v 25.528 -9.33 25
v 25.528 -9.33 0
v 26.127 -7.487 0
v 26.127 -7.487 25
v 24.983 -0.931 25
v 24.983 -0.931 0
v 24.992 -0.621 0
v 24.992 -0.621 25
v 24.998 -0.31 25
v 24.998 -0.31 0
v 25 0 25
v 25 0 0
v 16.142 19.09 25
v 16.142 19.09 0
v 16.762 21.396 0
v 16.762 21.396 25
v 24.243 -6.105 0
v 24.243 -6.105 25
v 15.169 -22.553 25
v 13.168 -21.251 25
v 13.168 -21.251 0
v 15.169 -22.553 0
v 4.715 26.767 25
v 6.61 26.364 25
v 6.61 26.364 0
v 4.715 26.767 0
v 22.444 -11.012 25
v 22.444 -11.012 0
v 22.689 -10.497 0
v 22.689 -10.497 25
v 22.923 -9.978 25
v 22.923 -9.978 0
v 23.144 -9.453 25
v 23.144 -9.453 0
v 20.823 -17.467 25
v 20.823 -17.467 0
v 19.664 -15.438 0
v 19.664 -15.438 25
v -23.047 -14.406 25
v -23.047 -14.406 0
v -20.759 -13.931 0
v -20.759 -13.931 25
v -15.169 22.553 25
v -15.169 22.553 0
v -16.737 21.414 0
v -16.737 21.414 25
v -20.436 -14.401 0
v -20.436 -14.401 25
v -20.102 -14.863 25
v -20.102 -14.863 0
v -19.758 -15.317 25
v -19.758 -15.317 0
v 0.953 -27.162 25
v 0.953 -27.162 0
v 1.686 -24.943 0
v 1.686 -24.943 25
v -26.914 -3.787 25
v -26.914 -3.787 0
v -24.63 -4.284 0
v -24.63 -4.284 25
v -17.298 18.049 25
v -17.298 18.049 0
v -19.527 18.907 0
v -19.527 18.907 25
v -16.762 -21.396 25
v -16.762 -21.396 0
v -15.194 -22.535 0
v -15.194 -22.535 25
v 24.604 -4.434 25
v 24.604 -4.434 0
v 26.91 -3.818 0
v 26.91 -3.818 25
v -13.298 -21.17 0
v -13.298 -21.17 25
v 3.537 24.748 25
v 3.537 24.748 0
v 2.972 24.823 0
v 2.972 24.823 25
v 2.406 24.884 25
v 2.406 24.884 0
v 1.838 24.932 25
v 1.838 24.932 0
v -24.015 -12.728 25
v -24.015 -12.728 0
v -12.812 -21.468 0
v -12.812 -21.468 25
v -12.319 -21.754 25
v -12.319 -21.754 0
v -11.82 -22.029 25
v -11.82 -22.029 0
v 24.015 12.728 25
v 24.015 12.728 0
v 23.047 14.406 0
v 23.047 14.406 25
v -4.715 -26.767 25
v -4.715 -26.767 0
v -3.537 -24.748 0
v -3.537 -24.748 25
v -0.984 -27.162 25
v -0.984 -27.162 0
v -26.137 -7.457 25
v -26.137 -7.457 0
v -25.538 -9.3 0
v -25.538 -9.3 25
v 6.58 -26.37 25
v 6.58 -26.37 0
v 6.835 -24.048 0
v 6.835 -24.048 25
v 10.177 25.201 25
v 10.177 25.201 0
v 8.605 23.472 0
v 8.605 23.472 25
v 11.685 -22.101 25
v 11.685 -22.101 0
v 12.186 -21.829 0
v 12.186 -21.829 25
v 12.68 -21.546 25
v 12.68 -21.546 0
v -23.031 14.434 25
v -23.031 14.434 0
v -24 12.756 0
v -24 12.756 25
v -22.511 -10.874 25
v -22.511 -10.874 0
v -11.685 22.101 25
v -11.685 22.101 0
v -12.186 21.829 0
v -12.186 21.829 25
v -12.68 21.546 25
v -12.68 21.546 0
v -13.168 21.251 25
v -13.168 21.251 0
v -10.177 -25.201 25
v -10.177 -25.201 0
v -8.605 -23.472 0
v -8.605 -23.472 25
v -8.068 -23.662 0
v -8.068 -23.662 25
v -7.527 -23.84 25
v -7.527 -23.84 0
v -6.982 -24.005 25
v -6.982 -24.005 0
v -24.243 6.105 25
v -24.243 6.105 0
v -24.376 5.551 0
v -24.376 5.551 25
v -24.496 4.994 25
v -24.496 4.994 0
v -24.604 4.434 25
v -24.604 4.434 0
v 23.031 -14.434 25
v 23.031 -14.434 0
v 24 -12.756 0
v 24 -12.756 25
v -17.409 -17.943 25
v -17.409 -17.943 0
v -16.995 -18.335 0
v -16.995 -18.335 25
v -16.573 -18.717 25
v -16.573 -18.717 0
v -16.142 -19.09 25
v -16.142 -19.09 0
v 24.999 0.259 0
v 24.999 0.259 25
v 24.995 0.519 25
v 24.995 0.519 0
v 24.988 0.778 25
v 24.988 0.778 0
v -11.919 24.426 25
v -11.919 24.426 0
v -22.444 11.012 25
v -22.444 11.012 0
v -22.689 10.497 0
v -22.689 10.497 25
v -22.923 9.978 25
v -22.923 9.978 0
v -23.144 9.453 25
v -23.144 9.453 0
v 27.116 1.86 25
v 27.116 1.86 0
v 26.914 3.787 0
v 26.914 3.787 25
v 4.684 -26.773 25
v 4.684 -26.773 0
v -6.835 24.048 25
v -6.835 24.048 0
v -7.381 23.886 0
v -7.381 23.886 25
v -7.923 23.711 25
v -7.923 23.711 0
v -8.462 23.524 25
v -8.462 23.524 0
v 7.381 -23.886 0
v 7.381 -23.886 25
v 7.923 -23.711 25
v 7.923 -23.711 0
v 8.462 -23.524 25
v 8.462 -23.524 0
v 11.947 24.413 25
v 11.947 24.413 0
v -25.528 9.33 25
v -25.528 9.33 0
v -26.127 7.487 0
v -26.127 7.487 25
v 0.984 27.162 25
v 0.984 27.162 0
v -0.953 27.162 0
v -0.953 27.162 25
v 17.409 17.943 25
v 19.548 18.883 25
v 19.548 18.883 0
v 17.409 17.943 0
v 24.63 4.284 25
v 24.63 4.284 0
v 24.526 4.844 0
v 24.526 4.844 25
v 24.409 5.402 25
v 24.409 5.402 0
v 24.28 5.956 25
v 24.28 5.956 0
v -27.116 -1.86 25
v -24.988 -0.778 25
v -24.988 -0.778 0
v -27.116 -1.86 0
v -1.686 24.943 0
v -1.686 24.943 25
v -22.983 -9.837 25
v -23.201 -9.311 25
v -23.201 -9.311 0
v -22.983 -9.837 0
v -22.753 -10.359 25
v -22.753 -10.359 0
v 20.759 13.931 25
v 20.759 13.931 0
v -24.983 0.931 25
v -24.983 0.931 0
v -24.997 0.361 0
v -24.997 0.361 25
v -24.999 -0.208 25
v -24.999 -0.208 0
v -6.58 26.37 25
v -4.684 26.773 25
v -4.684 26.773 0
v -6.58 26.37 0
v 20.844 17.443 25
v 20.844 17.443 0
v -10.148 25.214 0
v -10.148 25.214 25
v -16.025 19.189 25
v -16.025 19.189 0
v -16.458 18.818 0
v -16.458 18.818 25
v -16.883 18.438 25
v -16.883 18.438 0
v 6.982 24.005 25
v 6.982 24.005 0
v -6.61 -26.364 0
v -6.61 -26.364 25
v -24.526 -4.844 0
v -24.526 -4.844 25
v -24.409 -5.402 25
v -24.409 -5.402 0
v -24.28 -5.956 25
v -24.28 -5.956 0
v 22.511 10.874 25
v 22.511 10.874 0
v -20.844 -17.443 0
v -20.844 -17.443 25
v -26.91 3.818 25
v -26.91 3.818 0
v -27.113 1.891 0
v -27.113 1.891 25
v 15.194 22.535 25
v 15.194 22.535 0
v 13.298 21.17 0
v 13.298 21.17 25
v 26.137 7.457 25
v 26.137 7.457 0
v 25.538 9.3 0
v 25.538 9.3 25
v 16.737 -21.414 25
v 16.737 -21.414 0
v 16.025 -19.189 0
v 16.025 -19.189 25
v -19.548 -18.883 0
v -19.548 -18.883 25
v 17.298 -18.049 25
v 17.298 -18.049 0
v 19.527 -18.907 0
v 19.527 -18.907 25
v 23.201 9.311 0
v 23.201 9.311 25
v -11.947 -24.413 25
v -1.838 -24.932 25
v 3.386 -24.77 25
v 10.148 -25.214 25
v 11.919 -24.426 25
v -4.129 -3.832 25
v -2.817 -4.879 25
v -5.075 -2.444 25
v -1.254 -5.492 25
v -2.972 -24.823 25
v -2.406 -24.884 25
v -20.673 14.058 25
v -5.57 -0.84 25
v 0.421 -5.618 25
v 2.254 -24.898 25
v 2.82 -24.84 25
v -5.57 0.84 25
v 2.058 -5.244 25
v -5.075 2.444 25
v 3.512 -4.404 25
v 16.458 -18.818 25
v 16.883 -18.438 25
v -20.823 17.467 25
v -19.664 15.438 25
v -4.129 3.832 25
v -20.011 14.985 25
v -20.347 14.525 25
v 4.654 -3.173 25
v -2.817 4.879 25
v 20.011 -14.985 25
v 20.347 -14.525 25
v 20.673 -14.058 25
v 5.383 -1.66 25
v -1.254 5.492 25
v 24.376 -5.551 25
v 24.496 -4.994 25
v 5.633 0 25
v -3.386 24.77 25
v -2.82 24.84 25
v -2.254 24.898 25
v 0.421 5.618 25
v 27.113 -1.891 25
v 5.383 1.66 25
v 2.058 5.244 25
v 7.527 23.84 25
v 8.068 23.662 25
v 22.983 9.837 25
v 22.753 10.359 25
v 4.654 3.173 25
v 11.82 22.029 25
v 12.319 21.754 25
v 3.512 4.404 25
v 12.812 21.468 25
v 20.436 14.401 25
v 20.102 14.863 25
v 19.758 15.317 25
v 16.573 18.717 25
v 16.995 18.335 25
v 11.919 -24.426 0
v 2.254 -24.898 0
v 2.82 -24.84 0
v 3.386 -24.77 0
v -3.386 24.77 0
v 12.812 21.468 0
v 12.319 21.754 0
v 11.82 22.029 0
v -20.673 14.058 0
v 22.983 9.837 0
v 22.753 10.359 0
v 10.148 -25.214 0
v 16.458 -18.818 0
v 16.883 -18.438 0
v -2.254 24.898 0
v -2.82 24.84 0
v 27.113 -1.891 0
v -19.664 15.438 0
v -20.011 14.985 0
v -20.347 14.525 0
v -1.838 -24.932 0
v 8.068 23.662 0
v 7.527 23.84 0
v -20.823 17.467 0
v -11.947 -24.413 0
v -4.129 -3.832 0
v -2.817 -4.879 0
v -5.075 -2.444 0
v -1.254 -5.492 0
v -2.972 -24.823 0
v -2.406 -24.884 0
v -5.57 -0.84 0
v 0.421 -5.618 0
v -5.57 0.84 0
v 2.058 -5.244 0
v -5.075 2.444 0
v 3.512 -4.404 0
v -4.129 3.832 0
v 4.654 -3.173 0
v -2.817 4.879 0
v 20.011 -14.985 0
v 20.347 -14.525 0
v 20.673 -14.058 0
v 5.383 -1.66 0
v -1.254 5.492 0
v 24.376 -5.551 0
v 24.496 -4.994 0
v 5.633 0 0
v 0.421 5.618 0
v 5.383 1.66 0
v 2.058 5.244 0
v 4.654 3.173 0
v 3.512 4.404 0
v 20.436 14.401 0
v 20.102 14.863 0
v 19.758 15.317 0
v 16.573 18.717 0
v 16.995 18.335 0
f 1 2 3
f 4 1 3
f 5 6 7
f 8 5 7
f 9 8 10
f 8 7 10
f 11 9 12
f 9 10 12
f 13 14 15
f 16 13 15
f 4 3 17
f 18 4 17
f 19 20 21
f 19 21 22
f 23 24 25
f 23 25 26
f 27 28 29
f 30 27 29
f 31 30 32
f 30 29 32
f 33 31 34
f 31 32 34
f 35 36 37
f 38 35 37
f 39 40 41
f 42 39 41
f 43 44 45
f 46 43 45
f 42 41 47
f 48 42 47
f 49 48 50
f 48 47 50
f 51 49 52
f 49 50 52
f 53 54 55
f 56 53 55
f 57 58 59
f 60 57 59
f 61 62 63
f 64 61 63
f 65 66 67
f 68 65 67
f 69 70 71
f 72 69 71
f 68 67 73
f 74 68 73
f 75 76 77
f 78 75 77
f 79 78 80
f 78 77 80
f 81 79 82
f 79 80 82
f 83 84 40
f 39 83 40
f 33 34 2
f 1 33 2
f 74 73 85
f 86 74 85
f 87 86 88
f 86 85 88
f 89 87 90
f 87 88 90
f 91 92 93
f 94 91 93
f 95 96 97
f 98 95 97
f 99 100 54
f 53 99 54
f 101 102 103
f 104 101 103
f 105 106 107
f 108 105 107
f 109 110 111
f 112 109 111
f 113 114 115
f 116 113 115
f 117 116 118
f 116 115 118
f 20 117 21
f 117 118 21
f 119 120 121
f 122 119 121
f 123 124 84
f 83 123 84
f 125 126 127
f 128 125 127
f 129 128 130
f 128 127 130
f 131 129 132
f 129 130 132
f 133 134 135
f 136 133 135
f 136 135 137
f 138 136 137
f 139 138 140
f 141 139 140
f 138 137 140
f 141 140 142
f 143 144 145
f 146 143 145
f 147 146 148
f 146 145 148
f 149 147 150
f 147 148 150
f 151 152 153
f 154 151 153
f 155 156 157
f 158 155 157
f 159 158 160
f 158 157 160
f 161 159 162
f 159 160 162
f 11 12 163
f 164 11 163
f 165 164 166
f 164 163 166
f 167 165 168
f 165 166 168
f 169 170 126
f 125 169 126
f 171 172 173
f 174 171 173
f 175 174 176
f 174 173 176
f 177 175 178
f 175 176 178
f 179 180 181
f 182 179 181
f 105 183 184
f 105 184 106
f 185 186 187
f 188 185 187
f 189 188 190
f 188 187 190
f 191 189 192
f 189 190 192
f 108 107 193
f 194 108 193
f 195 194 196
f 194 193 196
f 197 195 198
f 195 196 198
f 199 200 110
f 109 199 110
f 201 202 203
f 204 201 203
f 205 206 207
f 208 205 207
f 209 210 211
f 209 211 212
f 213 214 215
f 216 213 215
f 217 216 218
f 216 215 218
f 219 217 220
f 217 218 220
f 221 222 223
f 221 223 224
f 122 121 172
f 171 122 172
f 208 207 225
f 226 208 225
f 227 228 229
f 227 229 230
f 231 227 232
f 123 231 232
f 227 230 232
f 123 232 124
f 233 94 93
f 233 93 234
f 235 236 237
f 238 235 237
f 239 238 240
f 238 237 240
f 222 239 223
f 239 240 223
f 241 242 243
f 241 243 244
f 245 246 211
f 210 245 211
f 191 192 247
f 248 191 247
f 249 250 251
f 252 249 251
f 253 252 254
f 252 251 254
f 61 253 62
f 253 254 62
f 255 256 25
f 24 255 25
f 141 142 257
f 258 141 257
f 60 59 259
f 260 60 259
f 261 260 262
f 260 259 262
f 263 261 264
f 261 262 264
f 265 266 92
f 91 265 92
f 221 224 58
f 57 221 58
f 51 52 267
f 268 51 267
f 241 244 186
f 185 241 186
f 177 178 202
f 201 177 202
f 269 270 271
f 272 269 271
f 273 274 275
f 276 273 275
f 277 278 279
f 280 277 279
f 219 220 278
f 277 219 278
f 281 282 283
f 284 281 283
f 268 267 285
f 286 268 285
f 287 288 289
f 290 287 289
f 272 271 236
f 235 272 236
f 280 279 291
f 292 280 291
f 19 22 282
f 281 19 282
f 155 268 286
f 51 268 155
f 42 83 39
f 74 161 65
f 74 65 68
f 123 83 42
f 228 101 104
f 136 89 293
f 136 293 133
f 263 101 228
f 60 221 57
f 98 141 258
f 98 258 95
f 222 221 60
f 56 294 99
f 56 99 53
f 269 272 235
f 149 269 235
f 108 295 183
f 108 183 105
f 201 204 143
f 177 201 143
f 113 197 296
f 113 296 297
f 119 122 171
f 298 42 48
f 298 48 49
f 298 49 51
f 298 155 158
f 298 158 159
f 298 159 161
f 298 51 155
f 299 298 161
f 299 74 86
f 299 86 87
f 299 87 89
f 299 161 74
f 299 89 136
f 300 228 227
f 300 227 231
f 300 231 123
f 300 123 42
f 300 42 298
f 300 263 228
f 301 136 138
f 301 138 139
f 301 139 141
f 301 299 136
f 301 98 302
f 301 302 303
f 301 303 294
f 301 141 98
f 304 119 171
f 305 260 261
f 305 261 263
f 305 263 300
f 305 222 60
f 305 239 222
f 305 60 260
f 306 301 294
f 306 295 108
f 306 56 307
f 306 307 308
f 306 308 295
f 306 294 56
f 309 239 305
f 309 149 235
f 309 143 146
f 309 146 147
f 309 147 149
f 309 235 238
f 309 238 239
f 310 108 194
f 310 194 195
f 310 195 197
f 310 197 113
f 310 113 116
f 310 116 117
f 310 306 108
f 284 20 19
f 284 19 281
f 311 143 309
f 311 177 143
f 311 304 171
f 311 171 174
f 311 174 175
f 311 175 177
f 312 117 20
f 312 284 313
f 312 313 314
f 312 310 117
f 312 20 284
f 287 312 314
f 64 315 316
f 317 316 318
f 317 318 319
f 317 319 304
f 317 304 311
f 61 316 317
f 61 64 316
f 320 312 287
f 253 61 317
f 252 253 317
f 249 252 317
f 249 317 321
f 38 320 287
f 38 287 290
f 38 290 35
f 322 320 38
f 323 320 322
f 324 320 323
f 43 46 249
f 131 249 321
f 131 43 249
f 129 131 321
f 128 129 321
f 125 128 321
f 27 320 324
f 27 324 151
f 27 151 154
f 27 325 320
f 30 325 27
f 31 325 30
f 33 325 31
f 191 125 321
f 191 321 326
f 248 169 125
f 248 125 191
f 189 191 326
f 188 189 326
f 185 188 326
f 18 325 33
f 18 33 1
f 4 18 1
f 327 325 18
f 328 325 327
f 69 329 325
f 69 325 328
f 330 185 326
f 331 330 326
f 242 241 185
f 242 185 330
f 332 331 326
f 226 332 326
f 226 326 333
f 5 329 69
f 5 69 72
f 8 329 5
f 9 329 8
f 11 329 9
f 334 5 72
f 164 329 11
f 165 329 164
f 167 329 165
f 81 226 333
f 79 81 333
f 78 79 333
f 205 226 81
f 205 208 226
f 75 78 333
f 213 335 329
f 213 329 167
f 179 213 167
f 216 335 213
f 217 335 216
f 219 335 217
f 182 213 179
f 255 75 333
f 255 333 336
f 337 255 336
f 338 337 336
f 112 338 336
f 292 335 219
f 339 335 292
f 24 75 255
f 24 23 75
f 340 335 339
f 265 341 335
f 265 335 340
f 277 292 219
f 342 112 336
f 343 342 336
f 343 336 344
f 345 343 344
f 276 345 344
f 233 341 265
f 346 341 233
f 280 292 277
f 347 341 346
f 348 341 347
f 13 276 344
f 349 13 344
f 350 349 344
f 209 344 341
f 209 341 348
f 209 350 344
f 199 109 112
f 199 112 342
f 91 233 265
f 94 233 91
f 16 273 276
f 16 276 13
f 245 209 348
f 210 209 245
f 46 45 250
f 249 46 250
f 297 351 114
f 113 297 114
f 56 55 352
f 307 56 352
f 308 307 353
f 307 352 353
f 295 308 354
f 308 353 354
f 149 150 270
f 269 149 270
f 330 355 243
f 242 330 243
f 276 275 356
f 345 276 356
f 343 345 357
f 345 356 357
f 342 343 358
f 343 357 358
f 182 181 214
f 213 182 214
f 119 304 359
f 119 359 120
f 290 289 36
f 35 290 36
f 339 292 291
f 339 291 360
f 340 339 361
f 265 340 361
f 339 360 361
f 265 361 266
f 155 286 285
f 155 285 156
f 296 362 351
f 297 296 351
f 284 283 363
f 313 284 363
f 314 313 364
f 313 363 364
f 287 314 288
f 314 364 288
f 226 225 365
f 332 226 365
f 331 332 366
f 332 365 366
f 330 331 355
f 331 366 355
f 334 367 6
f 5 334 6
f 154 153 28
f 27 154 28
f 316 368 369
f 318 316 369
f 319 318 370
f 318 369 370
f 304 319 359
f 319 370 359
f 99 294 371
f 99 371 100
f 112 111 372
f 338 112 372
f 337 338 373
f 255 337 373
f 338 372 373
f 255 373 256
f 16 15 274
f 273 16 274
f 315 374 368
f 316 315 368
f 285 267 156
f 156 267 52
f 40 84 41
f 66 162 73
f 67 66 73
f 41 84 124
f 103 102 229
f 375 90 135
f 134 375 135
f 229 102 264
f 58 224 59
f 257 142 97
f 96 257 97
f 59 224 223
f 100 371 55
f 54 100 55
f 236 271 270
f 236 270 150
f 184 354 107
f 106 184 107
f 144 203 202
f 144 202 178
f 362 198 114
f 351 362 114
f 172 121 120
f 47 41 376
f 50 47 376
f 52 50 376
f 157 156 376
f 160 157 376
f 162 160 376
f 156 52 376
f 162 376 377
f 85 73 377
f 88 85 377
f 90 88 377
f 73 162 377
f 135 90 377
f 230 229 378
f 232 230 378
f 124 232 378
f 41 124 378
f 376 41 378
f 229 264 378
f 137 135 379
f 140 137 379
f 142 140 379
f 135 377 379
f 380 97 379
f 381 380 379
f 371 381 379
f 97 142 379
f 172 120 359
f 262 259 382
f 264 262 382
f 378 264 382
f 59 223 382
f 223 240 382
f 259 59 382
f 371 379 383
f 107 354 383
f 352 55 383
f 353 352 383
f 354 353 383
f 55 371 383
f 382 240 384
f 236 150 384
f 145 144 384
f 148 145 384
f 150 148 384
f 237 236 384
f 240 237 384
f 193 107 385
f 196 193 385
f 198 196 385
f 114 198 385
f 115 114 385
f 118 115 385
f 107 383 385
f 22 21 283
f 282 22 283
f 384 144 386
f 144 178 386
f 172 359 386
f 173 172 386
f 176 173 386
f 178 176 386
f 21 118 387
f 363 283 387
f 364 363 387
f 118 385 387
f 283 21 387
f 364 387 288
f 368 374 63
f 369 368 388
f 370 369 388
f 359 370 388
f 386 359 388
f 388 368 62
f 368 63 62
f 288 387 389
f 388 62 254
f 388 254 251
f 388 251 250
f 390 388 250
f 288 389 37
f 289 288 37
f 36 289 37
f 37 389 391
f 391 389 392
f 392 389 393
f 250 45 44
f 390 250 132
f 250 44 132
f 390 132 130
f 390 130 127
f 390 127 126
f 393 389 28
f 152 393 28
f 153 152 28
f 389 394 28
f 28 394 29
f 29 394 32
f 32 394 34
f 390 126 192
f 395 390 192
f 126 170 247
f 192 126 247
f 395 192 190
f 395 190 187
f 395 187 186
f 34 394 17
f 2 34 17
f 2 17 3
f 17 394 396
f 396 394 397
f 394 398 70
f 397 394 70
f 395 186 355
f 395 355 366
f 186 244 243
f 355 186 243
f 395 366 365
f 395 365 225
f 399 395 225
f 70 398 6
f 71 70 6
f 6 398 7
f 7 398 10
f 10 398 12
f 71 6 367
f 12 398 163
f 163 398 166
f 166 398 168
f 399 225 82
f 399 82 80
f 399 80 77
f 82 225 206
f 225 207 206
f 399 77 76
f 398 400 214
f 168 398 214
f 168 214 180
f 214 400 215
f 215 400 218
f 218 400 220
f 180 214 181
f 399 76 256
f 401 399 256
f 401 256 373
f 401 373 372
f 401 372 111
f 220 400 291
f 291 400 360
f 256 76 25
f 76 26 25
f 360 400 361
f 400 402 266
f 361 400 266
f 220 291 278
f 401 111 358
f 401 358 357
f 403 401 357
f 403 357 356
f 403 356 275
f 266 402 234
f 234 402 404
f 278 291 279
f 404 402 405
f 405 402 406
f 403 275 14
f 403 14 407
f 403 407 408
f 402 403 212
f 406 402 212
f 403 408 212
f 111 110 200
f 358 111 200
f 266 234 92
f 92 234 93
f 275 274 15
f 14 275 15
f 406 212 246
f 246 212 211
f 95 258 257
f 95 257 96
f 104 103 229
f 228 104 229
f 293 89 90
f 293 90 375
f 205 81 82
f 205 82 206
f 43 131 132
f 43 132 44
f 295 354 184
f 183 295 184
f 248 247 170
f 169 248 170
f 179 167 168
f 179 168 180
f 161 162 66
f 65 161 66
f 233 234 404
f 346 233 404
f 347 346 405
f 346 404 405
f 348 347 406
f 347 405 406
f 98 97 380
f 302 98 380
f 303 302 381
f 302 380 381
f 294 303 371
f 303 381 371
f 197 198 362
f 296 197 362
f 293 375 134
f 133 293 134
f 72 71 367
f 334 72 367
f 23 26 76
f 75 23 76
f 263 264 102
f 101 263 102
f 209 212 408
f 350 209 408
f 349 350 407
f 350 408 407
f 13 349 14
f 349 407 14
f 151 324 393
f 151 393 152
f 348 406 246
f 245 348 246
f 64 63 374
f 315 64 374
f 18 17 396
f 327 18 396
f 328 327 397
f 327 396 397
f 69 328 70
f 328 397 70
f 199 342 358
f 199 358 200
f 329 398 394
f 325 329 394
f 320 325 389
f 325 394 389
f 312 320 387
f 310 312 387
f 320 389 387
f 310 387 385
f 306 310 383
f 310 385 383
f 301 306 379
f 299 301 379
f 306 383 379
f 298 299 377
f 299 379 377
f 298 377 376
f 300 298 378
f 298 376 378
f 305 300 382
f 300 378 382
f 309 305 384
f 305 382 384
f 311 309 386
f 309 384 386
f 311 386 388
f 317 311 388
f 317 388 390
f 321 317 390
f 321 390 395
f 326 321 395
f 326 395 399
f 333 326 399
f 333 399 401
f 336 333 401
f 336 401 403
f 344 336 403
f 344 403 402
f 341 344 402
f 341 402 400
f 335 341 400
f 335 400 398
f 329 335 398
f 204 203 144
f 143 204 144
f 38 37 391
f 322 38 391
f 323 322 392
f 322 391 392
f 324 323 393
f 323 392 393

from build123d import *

# Parameters (mm, degrees)
F1_DEPTH = 25
F2_R     = 5.6332582932
F3_DEPTH = 25.001


with BuildPart() as f1:
    # F0 (on Top) → F1 (new body)
    with BuildSketch(Plane.XY):
        with BuildLine():
            ThreePointArc((24.9826599942, -0.9309670328), (24.9956646226, -0.4655642523), (25, 0))
            ThreePointArc((25, 0), (24.9969712413, 0.3891384843), (24.9878856992, 0.77818268))
            ThreePointArc((24.9878856992, 0.77818268), (24.8709209984, 2.5371812491), (24.6302878631, 4.283563911))
            ThreePointArc((24.6302878631, 4.283563911), (24.4694678339, 5.1230014568), (24.2800471673, 5.956451087))
            ThreePointArc((24.2800471673, 5.956451087), (23.7999220592, 7.6526929884), (23.2014539632, 9.3108825571))
            ThreePointArc((23.2014539632, 9.3108825571), (22.869619358, 10.0985400143), (22.5110540656, 10.8743939994))
            ThreePointArc((22.5110540656, 10.8743939994), (21.6887523213, 12.4337453224), (20.7586051922, 13.9312709568))
            ThreePointArc((20.7586051922, 13.9312709568), (20.2702587756, 14.6327239149), (19.7582198813, 15.3170737128))
            ThreePointArc((19.7582198813, 15.3170737128), (18.6296800329, 16.6713833221), (17.4085057635, 17.9427959661))
            ThreePointArc((17.4085057635, 17.9427959661), (16.7849906172, 18.5273875649), (16.1418566776, 19.0903238055))
            ThreePointArc((16.1418566776, 19.0903238055), (14.7564013318, 20.1804018725), (13.2975710976, 21.1701346926))
            ThreePointArc((13.2975710976, 21.1701346926), (12.5661378255, 21.6123154741), (11.82001688, 22.0292351424))
            ThreePointArc((11.82001688, 22.0292351424), (10.2381970835, 22.8074400247), (8.6054687659, 23.4722369475))
            ThreePointArc((8.6054687659, 23.4722369475), (7.7980845118, 23.7526814896), (6.9815856259, 24.0053631955))
            ThreePointArc((6.9815856259, 24.0053631955), (5.2725344943, 24.4376836056), (3.5372661556, 24.7484898154))
            ThreePointArc((3.5372661556, 24.7484898154), (2.6892174855, 24.854941346), (1.8380255786, 24.9323416865))
            ThreePointArc((1.8380255786, 24.9323416865), (0.9196352096, 24.9830796957), (0, 25))
            ThreePointArc((0, 25), (-0.8432457973, 24.9857746833), (-1.6855319595, 24.943114922))
            ThreePointArc((-1.6855319595, 24.943114922), (-2.5371812491, 24.8709209984), (-3.3858650063, 24.7696572071))
            ThreePointArc((-3.3858650063, 24.7696572071), (-5.1230014568, 24.4694678339), (-6.8346642398, 24.0476062162))
            ThreePointArc((-6.8346642398, 24.0476062162), (-7.6526929884, 23.7999220592), (-8.4617770432, 23.5244198498))
            ThreePointArc((-8.4617770432, 23.5244198498), (-10.0985400143, 22.869619358), (-11.6850888965, 22.1011017255))
            ThreePointArc((-11.6850888965, 22.1011017255), (-12.4337453224, 21.6887523213), (-13.1678688193, 21.2510524624))
            ThreePointArc((-13.1678688193, 21.2510524624), (-14.6327239149, 20.2702587756), (-16.0248190972, 19.1886730365))
            ThreePointArc((-16.0248190972, 19.1886730365), (-16.6713833221, 18.6296800329), (-17.2984615414, 18.0489121085))
            ThreePointArc((-17.2984615414, 18.0489121085), (-18.5273875649, 16.7849906172), (-19.6641878077, 15.4376072584))
            ThreePointArc((-19.6641878077, 15.4376072584), (-20.1804018725, 14.7564013318), (-20.673028487, 14.0579476871))
            ThreePointArc((-20.673028487, 14.0579476871), (-21.6123154741, 12.5661378255), (-22.4441371517, 11.0118439652))
            ThreePointArc((-22.4441371517, 11.0118439652), (-22.8074400247, 10.2381970835), (-23.1440848876, 9.4525834943))
            ThreePointArc((-23.1440848876, 9.4525834943), (-23.7526814896, 7.7980845118), (-24.2431700033, 6.1048102501))
            ThreePointArc((-24.2431700033, 6.1048102501), (-24.4376836056, 5.2725344943), (-24.6036337208, 4.4340960443))
            ThreePointArc((-24.6036337208, 4.4340960443), (-24.854941346, 2.6892174855), (-24.9826599942, 0.9309670328))
            ThreePointArc((-24.9826599942, 0.9309670328), (-24.9998831479, 0.0764368473), (-24.9878856992, -0.77818268))
            ThreePointArc((-24.9878856992, -0.77818268), (-24.8709209984, -2.5371812491), (-24.6302878631, -4.283563911))
            ThreePointArc((-24.6302878631, -4.283563911), (-24.4694678339, -5.1230014568), (-24.2800471673, -5.956451087))
            ThreePointArc((-24.2800471673, -5.956451087), (-23.7999220592, -7.6526929884), (-23.2014539632, -9.3108825571))
            ThreePointArc((-23.2014539632, -9.3108825571), (-22.869619358, -10.0985400143), (-22.5110540656, -10.8743939994))
            ThreePointArc((-22.5110540656, -10.8743939994), (-21.6887523213, -12.4337453224), (-20.7586051922, -13.9312709568))
            ThreePointArc((-20.7586051922, -13.9312709568), (-20.2702587756, -14.6327239149), (-19.7582198813, -15.3170737128))
            ThreePointArc((-19.7582198813, -15.3170737128), (-18.6296800329, -16.6713833221), (-17.4085057635, -17.9427959661))
            ThreePointArc((-17.4085057635, -17.9427959661), (-16.7849906172, -18.5273875649), (-16.1418566776, -19.0903238055))
            ThreePointArc((-16.1418566776, -19.0903238055), (-14.7564013318, -20.1804018725), (-13.2975710976, -21.1701346926))
            ThreePointArc((-13.2975710976, -21.1701346926), (-12.5661378255, -21.6123154741), (-11.82001688, -22.0292351424))
            ThreePointArc((-11.82001688, -22.0292351424), (-10.2381970835, -22.8074400247), (-8.6054687659, -23.4722369475))
            ThreePointArc((-8.6054687659, -23.4722369475), (-7.7980845118, -23.7526814896), (-6.9815856259, -24.0053631955))
            ThreePointArc((-6.9815856259, -24.0053631955), (-5.2725344943, -24.4376836056), (-3.5372661556, -24.7484898154))
            ThreePointArc((-3.5372661556, -24.7484898154), (-2.6892174855, -24.854941346), (-1.8380255786, -24.9323416865))
            ThreePointArc((-1.8380255786, -24.9323416865), (-0.0764368473, -24.9998831479), (1.6855319595, -24.943114922))
            ThreePointArc((1.6855319595, -24.943114922), (2.5371812491, -24.8709209984), (3.3858650063, -24.7696572071))
            ThreePointArc((3.3858650063, -24.7696572071), (5.1230014568, -24.4694678339), (6.8346642398, -24.0476062162))
            ThreePointArc((6.8346642398, -24.0476062162), (7.6526929884, -23.7999220592), (8.4617770432, -23.5244198498))
            ThreePointArc((8.4617770432, -23.5244198498), (10.0985400143, -22.869619358), (11.6850888965, -22.1011017255))
            ThreePointArc((11.6850888965, -22.1011017255), (12.4337453224, -21.6887523213), (13.1678688193, -21.2510524624))
            ThreePointArc((13.1678688193, -21.2510524624), (14.6327239149, -20.2702587756), (16.0248190972, -19.1886730365))
            ThreePointArc((16.0248190972, -19.1886730365), (16.6713833221, -18.6296800329), (17.2984615414, -18.0489121085))
            ThreePointArc((17.2984615414, -18.0489121085), (18.5273875649, -16.7849906172), (19.6641878077, -15.4376072584))
            ThreePointArc((19.6641878077, -15.4376072584), (20.1804018725, -14.7564013318), (20.673028487, -14.0579476871))
            ThreePointArc((20.673028487, -14.0579476871), (21.6123154741, -12.5661378255), (22.4441371517, -11.0118439652))
            ThreePointArc((22.4441371517, -11.0118439652), (22.8074400247, -10.2381970835), (23.1440848876, -9.4525834943))
            ThreePointArc((23.1440848876, -9.4525834943), (23.7526814896, -7.7980845118), (24.2431700033, -6.1048102501))
            ThreePointArc((24.2431700033, -6.1048102501), (24.4376836056, -5.2725344943), (24.6036337208, -4.4340960443))
            ThreePointArc((24.6036337208, -4.4340960443), (24.854941346, -2.6892174855), (24.9826599942, -0.9309670328))
        make_face()
        with BuildLine():
            ThreePointArc((24.6302878631, 4.283563911), (24.8709209984, 2.5371812491), (24.9878856992, 0.77818268))
            Line((24.9878856992, 0.77818268), (27.1162286769, 1.8601129156))
            Line((27.1162286769, 1.8601129156), (26.9136978769, 3.7870647602))
            Line((26.9136978769, 3.7870647602), (24.6302878631, 4.283563911))
        make_face()
        with BuildLine():
            Line((27.1129440427, -1.8913641228), (24.9826599942, -0.9309670328))
            ThreePointArc((24.9826599942, -0.9309670328), (24.854941346, -2.6892174855), (24.6036337208, -4.4340960443))
            Line((24.6036337208, -4.4340960443), (26.9104132427, -3.8183159673))
            Line((26.9104132427, -3.8183159673), (27.1129440427, -1.8913641228))
        make_face()
        with BuildLine():
            ThreePointArc((23.2014539632, 9.3108825571), (23.7999220592, 7.6526929884), (24.2800471673, 5.956451087))
            Line((24.2800471673, 5.956451087), (26.1369347999, 7.4572459383))
            Line((26.1369347999, 7.4572459383), (25.5381939676, 9.2999807407))
            Line((25.5381939676, 9.2999807407), (23.2014539632, 9.3108825571))
        make_face()
        with BuildLine():
            Line((26.1272244515, -7.4871313177), (24.2431700033, -6.1048102501))
            ThreePointArc((24.2431700033, -6.1048102501), (23.7526814896, -7.7980845118), (23.1440848876, -9.4525834943))
            Line((23.1440848876, -9.4525834943), (25.5284836192, -9.3298661202))
            Line((25.5284836192, -9.3298661202), (26.1272244515, -7.4871313177))
        make_face()
        with BuildLine():
            ThreePointArc((20.7586051922, 13.9312709568), (21.6887523213, 12.4337453224), (22.5110540656, 10.8743939994))
            Line((22.5110540656, 10.8743939994), (24.0153314531, 12.7284615297))
            Line((24.0153314531, 12.7284615297), (23.0465484361, 14.4064429367))
            Line((23.0465484361, 14.4064429367), (20.7586051922, 13.9312709568))
        make_face()
        with BuildLine():
            Line((23.9996197794, -12.7556749469), (22.4441371517, -11.0118439652))
            ThreePointArc((22.4441371517, -11.0118439652), (21.6123154741, -12.5661378255), (20.673028487, -14.0579476871))
            Line((20.673028487, -14.0579476871), (23.0308367624, -14.4336563539))
            Line((23.0308367624, -14.4336563539), (23.9996197794, -12.7556749469))
        make_face()
        with BuildLine():
            ThreePointArc((17.4085057635, 17.9427959661), (18.6296800329, 16.6713833221), (19.7582198813, 15.3170737128))
            Line((19.7582198813, 15.3170737128), (20.8441428836, 17.4433822743))
            Line((20.8441428836, 17.4433822743), (19.5476581484, 18.8832744465))
            Line((19.5476581484, 18.8832744465), (17.4085057635, 17.9427959661))
        make_face()
        with BuildLine():
            Line((20.82311656, -17.4667343724), (19.6641878077, -15.4376072584))
            ThreePointArc((19.6641878077, -15.4376072584), (18.5273875649, -16.7849906172), (17.2984615414, -18.0489121085))
            Line((17.2984615414, -18.0489121085), (19.5266318248, -18.9066265446))
            Line((19.5266318248, -18.9066265446), (20.82311656, -17.4667343724))
        make_face()
        with BuildLine():
            ThreePointArc((13.2975710976, 21.1701346926), (14.7564013318, 20.1804018725), (16.1418566776, 19.0903238055))
            Line((16.1418566776, 19.0903238055), (16.7619652487, 21.3959435108))
            Line((16.7619652487, 21.3959435108), (15.1944413994, 22.534816251))
            Line((15.1944413994, 22.534816251), (13.2975710976, 21.1701346926))
        make_face()
        with BuildLine():
            Line((16.7365432265, -21.4144136911), (16.0248190972, -19.1886730365))
            ThreePointArc((16.0248190972, -19.1886730365), (14.6327239149, -20.2702587756), (13.1678688193, -21.2510524624))
            Line((13.1678688193, -21.2510524624), (15.1690193773, -22.5532864312))
            Line((15.1690193773, -22.5532864312), (16.7365432265, -21.4144136911))
        make_face()
        with BuildLine():
            ThreePointArc((8.6054687659, 23.4722369475), (10.2381970835, 22.8074400247), (11.82001688, 22.0292351424))
            Line((11.82001688, 22.0292351424), (11.9472092996, 24.4133993468))
            Line((11.9472092996, 24.4133993468), (10.1771546504, 25.2014784512))
            Line((10.1771546504, 25.2014784512), (8.6054687659, 23.4722369475))
        make_face()
        with BuildLine():
            Line((11.9185026432, -24.4261803737), (11.6850888965, -22.1011017255))
            ThreePointArc((11.6850888965, -22.1011017255), (10.0985400143, -22.869619358), (8.4617770432, -23.5244198498))
            Line((8.4617770432, -23.5244198498), (10.148447994, -25.2142594781))
            Line((10.148447994, -25.2142594781), (11.9185026432, -24.4261803737))
        make_face()
        with BuildLine():
            ThreePointArc((3.5372661556, 24.7484898154), (5.2725344943, 24.4376836056), (6.9815856259, 24.0053631955))
            Line((6.9815856259, 24.0053631955), (6.6103029751, 26.3638724829))
            Line((6.6103029751, 26.3638724829), (4.7150774076, 26.7667151131))
            Line((4.7150774076, 26.7667151131), (3.5372661556, 24.7484898154))
        make_face()
        with BuildLine():
            Line((6.5795663031, -26.3704057642), (6.8346642398, -24.0476062162))
            ThreePointArc((6.8346642398, -24.0476062162), (5.1230014568, -24.4694678339), (3.3858650063, -24.7696572071))
            Line((3.3858650063, -24.7696572071), (4.6843407356, -26.7732483944))
            Line((4.6843407356, -26.7732483944), (6.5795663031, -26.3704057642))
        make_face()
        with BuildLine():
            ThreePointArc((0, 25), (0.9196352096, 24.9830796957), (1.8380255786, 24.9323416865))
            Line((1.8380255786, 24.9323416865), (0.9844946908, 27.1621178836))
            Line((0.9844946908, 27.1621178836), (-0.9530713432, 27.1621178836))
            Line((-0.9530713432, 27.1621178836), (-1.6855319595, 24.943114922))
            ThreePointArc((-1.6855319595, 24.943114922), (-0.8432457973, 24.9857746833), (0, 25))
        make_face()
        with BuildLine():
            Line((0.9530713432, -27.1621178836), (1.6855319595, -24.943114922))
            ThreePointArc((1.6855319595, -24.943114922), (-0.0764368473, -24.9998831479), (-1.8380255786, -24.9323416865))
            Line((-1.8380255786, -24.9323416865), (-0.9844946908, -27.1621178836))
            Line((-0.9844946908, -27.1621178836), (0.9530713432, -27.1621178836))
        make_face()
        with BuildLine():
            Line((-4.7150774076, -26.7667151131), (-3.5372661556, -24.7484898154))
            ThreePointArc((-3.5372661556, -24.7484898154), (-5.2725344943, -24.4376836056), (-6.9815856259, -24.0053631955))
            Line((-6.9815856259, -24.0053631955), (-6.6103029751, -26.3638724829))
            Line((-6.6103029751, -26.3638724829), (-4.7150774076, -26.7667151131))
        make_face()
        with BuildLine():
            ThreePointArc((-6.8346642398, 24.0476062162), (-5.1230014568, 24.4694678339), (-3.3858650063, 24.7696572071))
            Line((-3.3858650063, 24.7696572071), (-4.6843407356, 26.7732483944))
            Line((-4.6843407356, 26.7732483944), (-6.5795663031, 26.3704057642))
            Line((-6.5795663031, 26.3704057642), (-6.8346642398, 24.0476062162))
        make_face()
        with BuildLine():
            Line((-10.1771546504, -25.2014784512), (-8.6054687659, -23.4722369475))
            ThreePointArc((-8.6054687659, -23.4722369475), (-10.2381970835, -22.8074400247), (-11.82001688, -22.0292351424))
            Line((-11.82001688, -22.0292351424), (-11.9472092996, -24.4133993468))
            Line((-11.9472092996, -24.4133993468), (-10.1771546504, -25.2014784512))
        make_face()
        with BuildLine():
            ThreePointArc((-11.6850888965, 22.1011017255), (-10.0985400143, 22.869619358), (-8.4617770432, 23.5244198498))
            Line((-8.4617770432, 23.5244198498), (-10.148447994, 25.2142594781))
            Line((-10.148447994, 25.2142594781), (-11.9185026432, 24.4261803737))
            Line((-11.9185026432, 24.4261803737), (-11.6850888965, 22.1011017255))
        make_face()
        with BuildLine():
            Line((-15.1944413994, -22.534816251), (-13.2975710976, -21.1701346926))
            ThreePointArc((-13.2975710976, -21.1701346926), (-14.7564013318, -20.1804018725), (-16.1418566776, -19.0903238055))
            Line((-16.1418566776, -19.0903238055), (-16.7619652487, -21.3959435108))
            Line((-16.7619652487, -21.3959435108), (-15.1944413994, -22.534816251))
        make_face()
        with BuildLine():
            ThreePointArc((-16.0248190972, 19.1886730365), (-14.6327239149, 20.2702587756), (-13.1678688193, 21.2510524624))
            Line((-13.1678688193, 21.2510524624), (-15.1690193773, 22.5532864312))
            Line((-15.1690193773, 22.5532864312), (-16.7365432265, 21.4144136911))
            Line((-16.7365432265, 21.4144136911), (-16.0248190972, 19.1886730365))
        make_face()
        with BuildLine():
            Line((-19.5476581484, -18.8832744465), (-17.4085057635, -17.9427959661))
            ThreePointArc((-17.4085057635, -17.9427959661), (-18.6296800329, -16.6713833221), (-19.7582198813, -15.3170737128))
            Line((-19.7582198813, -15.3170737128), (-20.8441428836, -17.4433822743))
            Line((-20.8441428836, -17.4433822743), (-19.5476581484, -18.8832744465))
        make_face()
        with BuildLine():
            ThreePointArc((-19.6641878077, 15.4376072584), (-18.5273875649, 16.7849906172), (-17.2984615414, 18.0489121085))
            Line((-17.2984615414, 18.0489121085), (-19.5266318248, 18.9066265446))
            Line((-19.5266318248, 18.9066265446), (-20.82311656, 17.4667343724))
            Line((-20.82311656, 17.4667343724), (-19.6641878077, 15.4376072584))
        make_face()
        with BuildLine():
            Line((-23.0465484361, -14.4064429367), (-20.7586051922, -13.9312709568))
            ThreePointArc((-20.7586051922, -13.9312709568), (-21.6887523213, -12.4337453224), (-22.5110540656, -10.8743939994))
            Line((-22.5110540656, -10.8743939994), (-24.0153314531, -12.7284615297))
            Line((-24.0153314531, -12.7284615297), (-23.0465484361, -14.4064429367))
        make_face()
        with BuildLine():
            ThreePointArc((-22.4441371517, 11.0118439652), (-21.6123154741, 12.5661378255), (-20.673028487, 14.0579476871))
            Line((-20.673028487, 14.0579476871), (-23.0308367624, 14.4336563539))
            Line((-23.0308367624, 14.4336563539), (-23.9996197794, 12.7556749469))
            Line((-23.9996197794, 12.7556749469), (-22.4441371517, 11.0118439652))
        make_face()
        with BuildLine():
            Line((-25.5381939676, -9.2999807407), (-23.2014539632, -9.3108825571))
            ThreePointArc((-23.2014539632, -9.3108825571), (-23.7999220592, -7.6526929884), (-24.2800471673, -5.956451087))
            Line((-24.2800471673, -5.956451087), (-26.1369347999, -7.4572459383))
            Line((-26.1369347999, -7.4572459383), (-25.5381939676, -9.2999807407))
        make_face()
        with BuildLine():
            ThreePointArc((-24.2431700033, 6.1048102501), (-23.7526814896, 7.7980845118), (-23.1440848876, 9.4525834943))
            Line((-23.1440848876, 9.4525834943), (-25.5284836192, 9.3298661202))
            Line((-25.5284836192, 9.3298661202), (-26.1272244515, 7.4871313177))
            Line((-26.1272244515, 7.4871313177), (-24.2431700033, 6.1048102501))
        make_face()
        with BuildLine():
            Line((-26.9136978769, -3.7870647602), (-24.6302878631, -4.283563911))
            ThreePointArc((-24.6302878631, -4.283563911), (-24.8709209984, -2.5371812491), (-24.9878856992, -0.77818268))
            Line((-24.9878856992, -0.77818268), (-27.1162286769, -1.8601129156))
            Line((-27.1162286769, -1.8601129156), (-26.9136978769, -3.7870647602))
        make_face()
        with BuildLine():
            ThreePointArc((-24.9826599942, 0.9309670328), (-24.854941346, 2.6892174855), (-24.6036337208, 4.4340960443))
            Line((-24.6036337208, 4.4340960443), (-26.9104132427, 3.8183159673))
            Line((-26.9104132427, 3.8183159673), (-27.1129440427, 1.8913641228))
            Line((-27.1129440427, 1.8913641228), (-24.9826599942, 0.9309670328))
        make_face()
    extrude(amount=F1_DEPTH)

    # F2 (on face) → F3 (cut, through all)
    with BuildSketch(Plane(origin=(0, 0, 0), x_dir=(1, 0, 0), z_dir=(0, 0, -1))):
        Circle(F2_R)
    extrude(amount=-F3_DEPTH, mode=Mode.SUBTRACT)


solid = f1.part
